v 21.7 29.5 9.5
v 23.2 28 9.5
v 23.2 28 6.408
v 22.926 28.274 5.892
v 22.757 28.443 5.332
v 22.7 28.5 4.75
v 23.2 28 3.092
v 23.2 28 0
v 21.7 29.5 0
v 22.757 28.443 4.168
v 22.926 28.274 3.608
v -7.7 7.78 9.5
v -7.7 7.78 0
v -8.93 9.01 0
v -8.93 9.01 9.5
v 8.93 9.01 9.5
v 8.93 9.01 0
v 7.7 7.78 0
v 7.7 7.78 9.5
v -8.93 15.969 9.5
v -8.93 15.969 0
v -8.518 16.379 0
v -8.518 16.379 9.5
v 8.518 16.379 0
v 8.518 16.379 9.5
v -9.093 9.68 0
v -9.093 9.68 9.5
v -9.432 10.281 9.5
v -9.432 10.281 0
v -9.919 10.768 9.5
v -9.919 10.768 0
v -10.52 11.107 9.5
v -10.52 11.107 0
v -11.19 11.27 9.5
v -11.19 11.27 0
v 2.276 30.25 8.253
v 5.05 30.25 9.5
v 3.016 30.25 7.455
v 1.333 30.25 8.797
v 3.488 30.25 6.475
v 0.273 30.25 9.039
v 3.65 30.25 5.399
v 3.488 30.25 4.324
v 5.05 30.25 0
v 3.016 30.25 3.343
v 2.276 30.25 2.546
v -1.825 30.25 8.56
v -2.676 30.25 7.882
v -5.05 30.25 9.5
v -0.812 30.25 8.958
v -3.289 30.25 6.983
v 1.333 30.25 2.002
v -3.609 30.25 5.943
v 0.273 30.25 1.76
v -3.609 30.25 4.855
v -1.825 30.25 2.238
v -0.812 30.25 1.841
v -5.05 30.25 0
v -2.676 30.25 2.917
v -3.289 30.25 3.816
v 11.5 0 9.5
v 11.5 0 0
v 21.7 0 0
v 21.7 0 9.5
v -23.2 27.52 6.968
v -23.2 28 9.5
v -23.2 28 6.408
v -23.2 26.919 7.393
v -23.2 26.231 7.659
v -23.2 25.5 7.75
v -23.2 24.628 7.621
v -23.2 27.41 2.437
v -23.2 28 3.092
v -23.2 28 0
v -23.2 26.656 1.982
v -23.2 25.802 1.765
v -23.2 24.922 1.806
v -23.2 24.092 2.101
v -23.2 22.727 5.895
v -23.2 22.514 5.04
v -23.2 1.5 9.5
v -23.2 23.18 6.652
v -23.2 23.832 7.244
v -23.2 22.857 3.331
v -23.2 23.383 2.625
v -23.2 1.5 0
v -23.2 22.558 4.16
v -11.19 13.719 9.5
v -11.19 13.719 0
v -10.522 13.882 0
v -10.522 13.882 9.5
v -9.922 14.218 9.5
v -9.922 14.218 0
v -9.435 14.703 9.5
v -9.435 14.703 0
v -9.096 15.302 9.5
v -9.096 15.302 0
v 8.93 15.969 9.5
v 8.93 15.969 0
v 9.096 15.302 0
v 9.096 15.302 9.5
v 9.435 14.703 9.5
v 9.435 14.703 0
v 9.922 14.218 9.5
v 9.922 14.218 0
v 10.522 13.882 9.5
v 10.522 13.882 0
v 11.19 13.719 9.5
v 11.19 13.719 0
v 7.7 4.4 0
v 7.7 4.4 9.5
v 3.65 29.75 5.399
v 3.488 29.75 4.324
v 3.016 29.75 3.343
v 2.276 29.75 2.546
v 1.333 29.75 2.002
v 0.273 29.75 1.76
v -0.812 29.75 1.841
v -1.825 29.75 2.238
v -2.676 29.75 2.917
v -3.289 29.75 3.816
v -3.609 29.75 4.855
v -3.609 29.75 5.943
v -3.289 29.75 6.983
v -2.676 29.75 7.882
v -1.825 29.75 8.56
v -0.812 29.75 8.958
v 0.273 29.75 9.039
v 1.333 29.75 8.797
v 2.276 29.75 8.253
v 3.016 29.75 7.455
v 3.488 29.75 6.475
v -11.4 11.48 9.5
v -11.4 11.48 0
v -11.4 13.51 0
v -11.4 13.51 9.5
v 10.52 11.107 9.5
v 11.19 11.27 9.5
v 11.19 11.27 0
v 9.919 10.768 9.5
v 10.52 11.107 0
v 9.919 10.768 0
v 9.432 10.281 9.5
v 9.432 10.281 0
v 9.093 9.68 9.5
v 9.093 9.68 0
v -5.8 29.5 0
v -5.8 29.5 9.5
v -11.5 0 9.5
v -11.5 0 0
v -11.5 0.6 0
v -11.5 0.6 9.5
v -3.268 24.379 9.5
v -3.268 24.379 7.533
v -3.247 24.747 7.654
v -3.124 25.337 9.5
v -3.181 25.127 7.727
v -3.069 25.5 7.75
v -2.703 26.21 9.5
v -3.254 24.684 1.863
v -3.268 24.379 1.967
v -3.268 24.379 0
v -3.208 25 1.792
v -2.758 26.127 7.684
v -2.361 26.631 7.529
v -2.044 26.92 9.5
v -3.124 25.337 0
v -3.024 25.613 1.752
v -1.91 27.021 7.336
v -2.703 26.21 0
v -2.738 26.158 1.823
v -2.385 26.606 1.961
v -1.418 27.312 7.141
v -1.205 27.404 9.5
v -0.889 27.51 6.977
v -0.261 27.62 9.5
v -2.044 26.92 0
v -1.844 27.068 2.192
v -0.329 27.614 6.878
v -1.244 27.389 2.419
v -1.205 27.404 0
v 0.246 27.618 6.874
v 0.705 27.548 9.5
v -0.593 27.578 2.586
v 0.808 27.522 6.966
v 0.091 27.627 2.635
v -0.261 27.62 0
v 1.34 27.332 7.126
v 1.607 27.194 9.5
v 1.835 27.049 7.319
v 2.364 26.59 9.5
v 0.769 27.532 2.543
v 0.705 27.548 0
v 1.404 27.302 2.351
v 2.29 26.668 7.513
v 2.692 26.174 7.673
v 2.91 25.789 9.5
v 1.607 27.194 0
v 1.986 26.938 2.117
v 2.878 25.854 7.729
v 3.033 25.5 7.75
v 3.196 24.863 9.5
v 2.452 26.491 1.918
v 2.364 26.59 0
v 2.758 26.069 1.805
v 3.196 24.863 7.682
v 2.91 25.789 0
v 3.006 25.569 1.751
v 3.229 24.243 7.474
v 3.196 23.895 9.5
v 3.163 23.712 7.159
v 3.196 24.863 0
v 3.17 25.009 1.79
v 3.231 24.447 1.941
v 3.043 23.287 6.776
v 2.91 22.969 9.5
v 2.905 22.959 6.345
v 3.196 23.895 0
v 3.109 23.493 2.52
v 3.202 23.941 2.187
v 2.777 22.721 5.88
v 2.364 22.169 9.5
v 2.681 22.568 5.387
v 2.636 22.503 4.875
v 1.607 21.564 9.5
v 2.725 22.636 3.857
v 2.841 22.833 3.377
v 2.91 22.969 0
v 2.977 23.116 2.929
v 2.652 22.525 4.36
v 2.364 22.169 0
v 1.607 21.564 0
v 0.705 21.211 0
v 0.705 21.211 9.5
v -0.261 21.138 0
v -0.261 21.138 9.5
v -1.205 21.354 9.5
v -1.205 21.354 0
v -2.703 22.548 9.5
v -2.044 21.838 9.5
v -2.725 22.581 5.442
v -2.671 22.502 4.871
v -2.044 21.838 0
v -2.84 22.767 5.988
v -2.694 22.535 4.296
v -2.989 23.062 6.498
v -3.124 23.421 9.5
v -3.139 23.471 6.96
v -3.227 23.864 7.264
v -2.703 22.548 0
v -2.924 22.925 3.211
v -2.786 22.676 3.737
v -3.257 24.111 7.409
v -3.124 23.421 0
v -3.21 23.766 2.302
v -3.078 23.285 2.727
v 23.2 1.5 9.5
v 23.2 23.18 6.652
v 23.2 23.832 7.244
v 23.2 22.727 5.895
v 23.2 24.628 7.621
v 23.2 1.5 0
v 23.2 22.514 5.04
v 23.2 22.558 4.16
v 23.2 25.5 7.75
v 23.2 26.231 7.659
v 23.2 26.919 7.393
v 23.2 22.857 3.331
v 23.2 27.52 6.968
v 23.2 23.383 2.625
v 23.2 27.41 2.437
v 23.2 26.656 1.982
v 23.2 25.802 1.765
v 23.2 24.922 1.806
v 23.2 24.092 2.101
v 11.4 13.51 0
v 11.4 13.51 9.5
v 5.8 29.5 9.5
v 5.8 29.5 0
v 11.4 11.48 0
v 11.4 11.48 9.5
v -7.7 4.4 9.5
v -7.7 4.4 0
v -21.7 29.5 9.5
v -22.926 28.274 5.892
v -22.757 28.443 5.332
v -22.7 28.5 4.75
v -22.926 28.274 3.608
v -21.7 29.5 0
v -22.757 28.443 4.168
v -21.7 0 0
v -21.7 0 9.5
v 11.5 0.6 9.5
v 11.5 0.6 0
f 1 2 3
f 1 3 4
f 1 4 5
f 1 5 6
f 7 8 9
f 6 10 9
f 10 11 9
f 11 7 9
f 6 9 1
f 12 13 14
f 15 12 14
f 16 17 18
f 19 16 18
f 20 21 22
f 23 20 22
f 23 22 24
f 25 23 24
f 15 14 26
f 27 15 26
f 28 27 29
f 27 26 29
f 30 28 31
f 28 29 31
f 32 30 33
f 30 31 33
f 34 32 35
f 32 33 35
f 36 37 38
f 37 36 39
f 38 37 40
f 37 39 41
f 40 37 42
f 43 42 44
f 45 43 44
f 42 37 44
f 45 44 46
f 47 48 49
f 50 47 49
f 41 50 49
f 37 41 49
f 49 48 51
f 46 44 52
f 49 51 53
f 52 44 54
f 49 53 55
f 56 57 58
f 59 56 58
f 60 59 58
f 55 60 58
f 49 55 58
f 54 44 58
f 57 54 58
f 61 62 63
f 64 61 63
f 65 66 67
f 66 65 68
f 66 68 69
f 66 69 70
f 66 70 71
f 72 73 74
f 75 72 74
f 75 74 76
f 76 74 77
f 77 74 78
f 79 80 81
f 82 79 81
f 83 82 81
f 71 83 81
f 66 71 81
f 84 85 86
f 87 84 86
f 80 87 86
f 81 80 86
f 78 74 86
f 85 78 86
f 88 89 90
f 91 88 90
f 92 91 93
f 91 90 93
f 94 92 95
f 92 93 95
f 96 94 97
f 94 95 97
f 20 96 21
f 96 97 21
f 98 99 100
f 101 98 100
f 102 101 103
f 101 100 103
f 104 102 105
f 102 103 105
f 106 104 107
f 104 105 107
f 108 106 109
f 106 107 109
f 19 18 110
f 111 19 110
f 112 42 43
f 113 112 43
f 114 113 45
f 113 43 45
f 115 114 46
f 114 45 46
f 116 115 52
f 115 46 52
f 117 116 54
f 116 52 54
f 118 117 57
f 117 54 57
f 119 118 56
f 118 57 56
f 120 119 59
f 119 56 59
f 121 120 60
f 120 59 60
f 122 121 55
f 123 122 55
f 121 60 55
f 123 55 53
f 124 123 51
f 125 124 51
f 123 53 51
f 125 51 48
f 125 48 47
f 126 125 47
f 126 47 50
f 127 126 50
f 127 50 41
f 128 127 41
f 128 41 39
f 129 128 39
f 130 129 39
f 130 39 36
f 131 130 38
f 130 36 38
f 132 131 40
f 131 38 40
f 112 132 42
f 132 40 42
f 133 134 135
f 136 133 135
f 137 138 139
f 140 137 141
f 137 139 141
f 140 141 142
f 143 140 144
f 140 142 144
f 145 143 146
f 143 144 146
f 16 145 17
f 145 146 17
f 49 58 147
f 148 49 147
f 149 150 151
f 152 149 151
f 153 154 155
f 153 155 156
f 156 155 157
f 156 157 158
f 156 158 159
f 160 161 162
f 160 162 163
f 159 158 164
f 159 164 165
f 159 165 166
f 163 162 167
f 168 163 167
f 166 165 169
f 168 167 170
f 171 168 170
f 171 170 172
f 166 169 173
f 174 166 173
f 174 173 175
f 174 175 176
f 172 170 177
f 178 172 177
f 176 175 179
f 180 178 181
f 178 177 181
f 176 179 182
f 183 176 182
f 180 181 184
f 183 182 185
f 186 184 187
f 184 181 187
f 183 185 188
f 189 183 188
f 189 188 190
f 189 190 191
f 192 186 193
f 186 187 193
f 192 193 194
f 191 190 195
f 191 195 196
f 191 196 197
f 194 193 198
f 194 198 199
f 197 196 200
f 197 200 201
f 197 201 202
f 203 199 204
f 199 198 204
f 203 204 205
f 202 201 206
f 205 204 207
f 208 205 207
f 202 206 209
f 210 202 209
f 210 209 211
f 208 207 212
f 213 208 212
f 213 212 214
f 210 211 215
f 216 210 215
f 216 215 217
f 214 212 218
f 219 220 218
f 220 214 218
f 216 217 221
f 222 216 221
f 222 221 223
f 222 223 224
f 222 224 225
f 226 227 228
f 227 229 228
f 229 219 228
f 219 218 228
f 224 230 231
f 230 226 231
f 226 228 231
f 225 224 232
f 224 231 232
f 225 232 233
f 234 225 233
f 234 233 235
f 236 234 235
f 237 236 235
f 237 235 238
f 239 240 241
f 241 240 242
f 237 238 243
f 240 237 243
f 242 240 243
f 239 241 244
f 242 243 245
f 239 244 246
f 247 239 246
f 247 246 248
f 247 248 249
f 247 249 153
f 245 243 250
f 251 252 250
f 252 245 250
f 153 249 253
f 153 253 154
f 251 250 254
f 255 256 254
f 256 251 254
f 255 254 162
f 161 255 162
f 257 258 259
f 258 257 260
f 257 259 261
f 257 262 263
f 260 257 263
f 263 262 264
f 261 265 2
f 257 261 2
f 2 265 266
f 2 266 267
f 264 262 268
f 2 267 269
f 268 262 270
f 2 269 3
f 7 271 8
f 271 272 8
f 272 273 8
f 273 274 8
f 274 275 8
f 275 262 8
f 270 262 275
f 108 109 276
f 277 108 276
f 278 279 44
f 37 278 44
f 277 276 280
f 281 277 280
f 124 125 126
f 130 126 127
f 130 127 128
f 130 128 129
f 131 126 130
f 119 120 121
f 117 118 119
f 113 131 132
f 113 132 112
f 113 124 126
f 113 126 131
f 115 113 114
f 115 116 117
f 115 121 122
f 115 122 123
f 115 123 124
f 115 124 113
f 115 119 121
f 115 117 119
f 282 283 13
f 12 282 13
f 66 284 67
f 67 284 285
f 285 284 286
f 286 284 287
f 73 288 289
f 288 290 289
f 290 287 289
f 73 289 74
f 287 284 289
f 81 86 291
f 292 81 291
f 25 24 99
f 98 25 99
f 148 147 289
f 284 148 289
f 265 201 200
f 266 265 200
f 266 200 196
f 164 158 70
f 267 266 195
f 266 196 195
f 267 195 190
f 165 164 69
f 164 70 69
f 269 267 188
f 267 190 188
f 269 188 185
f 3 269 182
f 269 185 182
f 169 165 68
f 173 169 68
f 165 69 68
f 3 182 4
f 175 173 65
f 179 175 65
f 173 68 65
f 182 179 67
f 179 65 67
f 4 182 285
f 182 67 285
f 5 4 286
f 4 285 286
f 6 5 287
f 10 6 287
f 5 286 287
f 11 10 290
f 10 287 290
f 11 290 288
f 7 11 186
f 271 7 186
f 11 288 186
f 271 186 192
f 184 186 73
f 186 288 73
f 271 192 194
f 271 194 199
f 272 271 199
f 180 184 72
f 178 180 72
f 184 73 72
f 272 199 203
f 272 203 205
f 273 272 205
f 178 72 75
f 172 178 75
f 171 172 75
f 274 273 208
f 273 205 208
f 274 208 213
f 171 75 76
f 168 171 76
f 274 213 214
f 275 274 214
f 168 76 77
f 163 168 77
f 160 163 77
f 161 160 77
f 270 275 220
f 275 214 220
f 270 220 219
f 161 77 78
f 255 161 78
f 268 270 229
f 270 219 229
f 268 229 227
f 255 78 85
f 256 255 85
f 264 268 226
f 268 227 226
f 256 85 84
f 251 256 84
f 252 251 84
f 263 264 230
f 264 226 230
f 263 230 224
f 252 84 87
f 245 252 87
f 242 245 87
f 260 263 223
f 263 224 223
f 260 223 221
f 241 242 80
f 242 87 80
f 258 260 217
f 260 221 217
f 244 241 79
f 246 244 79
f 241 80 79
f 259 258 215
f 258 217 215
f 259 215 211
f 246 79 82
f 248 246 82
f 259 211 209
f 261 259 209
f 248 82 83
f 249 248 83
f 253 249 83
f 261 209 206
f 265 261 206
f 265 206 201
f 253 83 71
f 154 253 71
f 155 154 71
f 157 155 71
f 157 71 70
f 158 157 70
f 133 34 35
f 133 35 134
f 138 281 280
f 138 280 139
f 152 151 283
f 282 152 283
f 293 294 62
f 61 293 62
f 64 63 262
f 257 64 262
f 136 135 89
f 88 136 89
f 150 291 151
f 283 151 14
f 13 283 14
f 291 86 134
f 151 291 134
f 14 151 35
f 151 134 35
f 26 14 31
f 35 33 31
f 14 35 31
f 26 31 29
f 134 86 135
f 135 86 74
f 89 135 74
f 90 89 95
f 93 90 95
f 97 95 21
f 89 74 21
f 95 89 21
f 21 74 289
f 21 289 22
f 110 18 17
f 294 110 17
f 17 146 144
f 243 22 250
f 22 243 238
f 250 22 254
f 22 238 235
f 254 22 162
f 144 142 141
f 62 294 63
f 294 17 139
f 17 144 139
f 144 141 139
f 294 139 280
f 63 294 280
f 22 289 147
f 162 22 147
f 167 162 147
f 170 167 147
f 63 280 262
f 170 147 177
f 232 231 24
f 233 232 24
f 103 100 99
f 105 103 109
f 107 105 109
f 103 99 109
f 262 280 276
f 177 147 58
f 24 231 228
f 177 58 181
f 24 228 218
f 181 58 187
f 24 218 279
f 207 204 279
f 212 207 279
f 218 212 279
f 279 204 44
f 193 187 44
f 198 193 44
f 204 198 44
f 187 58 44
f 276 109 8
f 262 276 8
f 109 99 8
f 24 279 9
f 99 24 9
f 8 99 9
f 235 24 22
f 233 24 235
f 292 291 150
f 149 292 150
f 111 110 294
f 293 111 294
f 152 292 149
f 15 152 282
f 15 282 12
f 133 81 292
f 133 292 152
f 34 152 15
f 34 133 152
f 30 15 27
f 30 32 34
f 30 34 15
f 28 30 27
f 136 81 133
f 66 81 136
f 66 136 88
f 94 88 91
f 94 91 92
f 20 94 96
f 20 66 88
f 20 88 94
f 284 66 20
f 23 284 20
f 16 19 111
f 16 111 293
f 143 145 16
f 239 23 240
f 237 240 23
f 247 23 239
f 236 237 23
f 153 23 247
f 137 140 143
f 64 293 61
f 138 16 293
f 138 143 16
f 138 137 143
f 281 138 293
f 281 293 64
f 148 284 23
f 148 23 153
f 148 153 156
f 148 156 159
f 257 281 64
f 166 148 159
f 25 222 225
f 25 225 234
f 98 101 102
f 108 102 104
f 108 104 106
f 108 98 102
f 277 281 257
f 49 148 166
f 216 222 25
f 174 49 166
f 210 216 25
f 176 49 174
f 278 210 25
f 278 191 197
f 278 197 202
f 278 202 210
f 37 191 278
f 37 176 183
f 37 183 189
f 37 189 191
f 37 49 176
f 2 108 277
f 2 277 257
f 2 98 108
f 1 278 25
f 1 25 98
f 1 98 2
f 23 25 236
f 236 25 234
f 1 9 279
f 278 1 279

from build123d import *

# Parameters (mm, degrees)
ENDCAP_1_DEPTH                  = 9.5
TAP_DRILL_FOR_M6X1_0_TAP1_D     = 6.5
TAP_DRILL_FOR_M6X1_0_TAP1_DEPTH = 12.5
TAP_DRILL_FOR_M6X1_0_TAP1_TIP   = 1.691842914
TAP_DRILL_FOR_M6X1_0_TAP2_D     = 6
SKETCH9_R                       = 3.65
CUT_EXTRUDE1_DEPTH              = 0.5


with BuildPart() as part:
    # Sketch3 → Endcap 1 (new body)
    with BuildSketch(Plane.XY):
        with BuildLine():
            Line((-21.7, 0), (-11.5, 0))
            Line((-11.5, 0), (-11.5, 0.6))
            Line((-11.5, 0.6), (-7.7, 4.4))
            Line((-7.7, 4.4), (-7.7, 7.78))
            Line((-7.7, 7.78), (-8.93, 9.01))
            ThreePointArc((-8.93, 9.01), (-9.658631808, 10.541368192), (-11.19, 11.27))
            Line((-11.19, 11.27), (-11.4, 11.48))
            Line((-11.4, 11.48), (-11.4, 13.51))
            Line((-11.4, 13.51), (-11.19, 13.719070796))
            ThreePointArc((-11.19, 13.719070796), (-9.661781613, 14.44408255), (-8.93, 15.969070796))
            Line((-8.93, 15.969070796), (-8.518177778, 16.379070796))
            Line((-8.518177778, 16.379070796), (8.518177778, 16.379070796))
            Line((8.518177778, 16.379070796), (8.93, 15.969070796))
            ThreePointArc((8.93, 15.969070796), (9.661781613, 14.44408255), (11.19, 13.719070796))
            Line((11.19, 13.719070796), (11.4, 13.51))
            Line((11.4, 13.51), (11.4, 11.48))
            Line((11.4, 11.48), (11.19, 11.27))
            ThreePointArc((11.19, 11.27), (9.658631808, 10.541368192), (8.93, 9.01))
            Line((8.93, 9.01), (7.7, 7.78))
            Line((7.7, 7.78), (7.7, 4.4))
            Line((7.7, 4.4), (11.5, 0.6))
            Line((11.5, 0.6), (11.5, 0))
            Line((11.5, 0), (21.7, 0))
            Line((21.7, 0), (23.2, 1.5))
            Line((23.2, 1.5), (23.2, 28))
            Line((23.2, 28), (21.7, 29.5))
            Line((21.7, 29.5), (5.8, 29.5))
            Line((5.8, 29.5), (5.05, 30.25))
            Line((5.05, 30.25), (-5.05, 30.25))
            Line((-5.05, 30.25), (-5.8, 29.5))
            Line((-5.8, 29.5), (-21.7, 29.5))
            Line((-21.7, 29.5), (-23.2, 28))
            Line((-23.2, 28), (-23.2, 1.5))
            Line((-23.2, 1.5), (-21.7, 0))
        make_face()
    extrude(amount=ENDCAP_1_DEPTH)

    # Tap Drill for M6x1.0 Tap1
    with Locations(Plane.XY.offset(9.5)):
        with Locations((-0.017990465, 24.379070796)):
            Hole(TAP_DRILL_FOR_M6X1_0_TAP1_D / 2, depth=TAP_DRILL_FOR_M6X1_0_TAP1_DEPTH)
            with Locations((0, 0, -(TAP_DRILL_FOR_M6X1_0_TAP1_DEPTH + TAP_DRILL_FOR_M6X1_0_TAP1_TIP / 2))):  # 125° drill point
                Cone(0, TAP_DRILL_FOR_M6X1_0_TAP1_D / 2, TAP_DRILL_FOR_M6X1_0_TAP1_TIP, mode=Mode.SUBTRACT)

    # Tap Drill for M6x1.0 Tap2 (through all)
    with Locations(Plane(origin=(23.2, 0, 0), x_dir=(0, 0, -1), z_dir=(1, 0, 0))):
        with Locations((-4.75, 25.5)):
            Hole(TAP_DRILL_FOR_M6X1_0_TAP2_D / 2)

    # Sketch9 → Cut-Extrude1 (cut)
    with BuildSketch(Plane(origin=(0, 30.25, 0), x_dir=(1, 0, 0), z_dir=(0, 1, 0))):
        with Locations((0, -5.399368506)):
            Circle(SKETCH9_R)
    extrude(amount=-CUT_EXTRUDE1_DEPTH, mode=Mode.SUBTRACT)


solid = part.part
